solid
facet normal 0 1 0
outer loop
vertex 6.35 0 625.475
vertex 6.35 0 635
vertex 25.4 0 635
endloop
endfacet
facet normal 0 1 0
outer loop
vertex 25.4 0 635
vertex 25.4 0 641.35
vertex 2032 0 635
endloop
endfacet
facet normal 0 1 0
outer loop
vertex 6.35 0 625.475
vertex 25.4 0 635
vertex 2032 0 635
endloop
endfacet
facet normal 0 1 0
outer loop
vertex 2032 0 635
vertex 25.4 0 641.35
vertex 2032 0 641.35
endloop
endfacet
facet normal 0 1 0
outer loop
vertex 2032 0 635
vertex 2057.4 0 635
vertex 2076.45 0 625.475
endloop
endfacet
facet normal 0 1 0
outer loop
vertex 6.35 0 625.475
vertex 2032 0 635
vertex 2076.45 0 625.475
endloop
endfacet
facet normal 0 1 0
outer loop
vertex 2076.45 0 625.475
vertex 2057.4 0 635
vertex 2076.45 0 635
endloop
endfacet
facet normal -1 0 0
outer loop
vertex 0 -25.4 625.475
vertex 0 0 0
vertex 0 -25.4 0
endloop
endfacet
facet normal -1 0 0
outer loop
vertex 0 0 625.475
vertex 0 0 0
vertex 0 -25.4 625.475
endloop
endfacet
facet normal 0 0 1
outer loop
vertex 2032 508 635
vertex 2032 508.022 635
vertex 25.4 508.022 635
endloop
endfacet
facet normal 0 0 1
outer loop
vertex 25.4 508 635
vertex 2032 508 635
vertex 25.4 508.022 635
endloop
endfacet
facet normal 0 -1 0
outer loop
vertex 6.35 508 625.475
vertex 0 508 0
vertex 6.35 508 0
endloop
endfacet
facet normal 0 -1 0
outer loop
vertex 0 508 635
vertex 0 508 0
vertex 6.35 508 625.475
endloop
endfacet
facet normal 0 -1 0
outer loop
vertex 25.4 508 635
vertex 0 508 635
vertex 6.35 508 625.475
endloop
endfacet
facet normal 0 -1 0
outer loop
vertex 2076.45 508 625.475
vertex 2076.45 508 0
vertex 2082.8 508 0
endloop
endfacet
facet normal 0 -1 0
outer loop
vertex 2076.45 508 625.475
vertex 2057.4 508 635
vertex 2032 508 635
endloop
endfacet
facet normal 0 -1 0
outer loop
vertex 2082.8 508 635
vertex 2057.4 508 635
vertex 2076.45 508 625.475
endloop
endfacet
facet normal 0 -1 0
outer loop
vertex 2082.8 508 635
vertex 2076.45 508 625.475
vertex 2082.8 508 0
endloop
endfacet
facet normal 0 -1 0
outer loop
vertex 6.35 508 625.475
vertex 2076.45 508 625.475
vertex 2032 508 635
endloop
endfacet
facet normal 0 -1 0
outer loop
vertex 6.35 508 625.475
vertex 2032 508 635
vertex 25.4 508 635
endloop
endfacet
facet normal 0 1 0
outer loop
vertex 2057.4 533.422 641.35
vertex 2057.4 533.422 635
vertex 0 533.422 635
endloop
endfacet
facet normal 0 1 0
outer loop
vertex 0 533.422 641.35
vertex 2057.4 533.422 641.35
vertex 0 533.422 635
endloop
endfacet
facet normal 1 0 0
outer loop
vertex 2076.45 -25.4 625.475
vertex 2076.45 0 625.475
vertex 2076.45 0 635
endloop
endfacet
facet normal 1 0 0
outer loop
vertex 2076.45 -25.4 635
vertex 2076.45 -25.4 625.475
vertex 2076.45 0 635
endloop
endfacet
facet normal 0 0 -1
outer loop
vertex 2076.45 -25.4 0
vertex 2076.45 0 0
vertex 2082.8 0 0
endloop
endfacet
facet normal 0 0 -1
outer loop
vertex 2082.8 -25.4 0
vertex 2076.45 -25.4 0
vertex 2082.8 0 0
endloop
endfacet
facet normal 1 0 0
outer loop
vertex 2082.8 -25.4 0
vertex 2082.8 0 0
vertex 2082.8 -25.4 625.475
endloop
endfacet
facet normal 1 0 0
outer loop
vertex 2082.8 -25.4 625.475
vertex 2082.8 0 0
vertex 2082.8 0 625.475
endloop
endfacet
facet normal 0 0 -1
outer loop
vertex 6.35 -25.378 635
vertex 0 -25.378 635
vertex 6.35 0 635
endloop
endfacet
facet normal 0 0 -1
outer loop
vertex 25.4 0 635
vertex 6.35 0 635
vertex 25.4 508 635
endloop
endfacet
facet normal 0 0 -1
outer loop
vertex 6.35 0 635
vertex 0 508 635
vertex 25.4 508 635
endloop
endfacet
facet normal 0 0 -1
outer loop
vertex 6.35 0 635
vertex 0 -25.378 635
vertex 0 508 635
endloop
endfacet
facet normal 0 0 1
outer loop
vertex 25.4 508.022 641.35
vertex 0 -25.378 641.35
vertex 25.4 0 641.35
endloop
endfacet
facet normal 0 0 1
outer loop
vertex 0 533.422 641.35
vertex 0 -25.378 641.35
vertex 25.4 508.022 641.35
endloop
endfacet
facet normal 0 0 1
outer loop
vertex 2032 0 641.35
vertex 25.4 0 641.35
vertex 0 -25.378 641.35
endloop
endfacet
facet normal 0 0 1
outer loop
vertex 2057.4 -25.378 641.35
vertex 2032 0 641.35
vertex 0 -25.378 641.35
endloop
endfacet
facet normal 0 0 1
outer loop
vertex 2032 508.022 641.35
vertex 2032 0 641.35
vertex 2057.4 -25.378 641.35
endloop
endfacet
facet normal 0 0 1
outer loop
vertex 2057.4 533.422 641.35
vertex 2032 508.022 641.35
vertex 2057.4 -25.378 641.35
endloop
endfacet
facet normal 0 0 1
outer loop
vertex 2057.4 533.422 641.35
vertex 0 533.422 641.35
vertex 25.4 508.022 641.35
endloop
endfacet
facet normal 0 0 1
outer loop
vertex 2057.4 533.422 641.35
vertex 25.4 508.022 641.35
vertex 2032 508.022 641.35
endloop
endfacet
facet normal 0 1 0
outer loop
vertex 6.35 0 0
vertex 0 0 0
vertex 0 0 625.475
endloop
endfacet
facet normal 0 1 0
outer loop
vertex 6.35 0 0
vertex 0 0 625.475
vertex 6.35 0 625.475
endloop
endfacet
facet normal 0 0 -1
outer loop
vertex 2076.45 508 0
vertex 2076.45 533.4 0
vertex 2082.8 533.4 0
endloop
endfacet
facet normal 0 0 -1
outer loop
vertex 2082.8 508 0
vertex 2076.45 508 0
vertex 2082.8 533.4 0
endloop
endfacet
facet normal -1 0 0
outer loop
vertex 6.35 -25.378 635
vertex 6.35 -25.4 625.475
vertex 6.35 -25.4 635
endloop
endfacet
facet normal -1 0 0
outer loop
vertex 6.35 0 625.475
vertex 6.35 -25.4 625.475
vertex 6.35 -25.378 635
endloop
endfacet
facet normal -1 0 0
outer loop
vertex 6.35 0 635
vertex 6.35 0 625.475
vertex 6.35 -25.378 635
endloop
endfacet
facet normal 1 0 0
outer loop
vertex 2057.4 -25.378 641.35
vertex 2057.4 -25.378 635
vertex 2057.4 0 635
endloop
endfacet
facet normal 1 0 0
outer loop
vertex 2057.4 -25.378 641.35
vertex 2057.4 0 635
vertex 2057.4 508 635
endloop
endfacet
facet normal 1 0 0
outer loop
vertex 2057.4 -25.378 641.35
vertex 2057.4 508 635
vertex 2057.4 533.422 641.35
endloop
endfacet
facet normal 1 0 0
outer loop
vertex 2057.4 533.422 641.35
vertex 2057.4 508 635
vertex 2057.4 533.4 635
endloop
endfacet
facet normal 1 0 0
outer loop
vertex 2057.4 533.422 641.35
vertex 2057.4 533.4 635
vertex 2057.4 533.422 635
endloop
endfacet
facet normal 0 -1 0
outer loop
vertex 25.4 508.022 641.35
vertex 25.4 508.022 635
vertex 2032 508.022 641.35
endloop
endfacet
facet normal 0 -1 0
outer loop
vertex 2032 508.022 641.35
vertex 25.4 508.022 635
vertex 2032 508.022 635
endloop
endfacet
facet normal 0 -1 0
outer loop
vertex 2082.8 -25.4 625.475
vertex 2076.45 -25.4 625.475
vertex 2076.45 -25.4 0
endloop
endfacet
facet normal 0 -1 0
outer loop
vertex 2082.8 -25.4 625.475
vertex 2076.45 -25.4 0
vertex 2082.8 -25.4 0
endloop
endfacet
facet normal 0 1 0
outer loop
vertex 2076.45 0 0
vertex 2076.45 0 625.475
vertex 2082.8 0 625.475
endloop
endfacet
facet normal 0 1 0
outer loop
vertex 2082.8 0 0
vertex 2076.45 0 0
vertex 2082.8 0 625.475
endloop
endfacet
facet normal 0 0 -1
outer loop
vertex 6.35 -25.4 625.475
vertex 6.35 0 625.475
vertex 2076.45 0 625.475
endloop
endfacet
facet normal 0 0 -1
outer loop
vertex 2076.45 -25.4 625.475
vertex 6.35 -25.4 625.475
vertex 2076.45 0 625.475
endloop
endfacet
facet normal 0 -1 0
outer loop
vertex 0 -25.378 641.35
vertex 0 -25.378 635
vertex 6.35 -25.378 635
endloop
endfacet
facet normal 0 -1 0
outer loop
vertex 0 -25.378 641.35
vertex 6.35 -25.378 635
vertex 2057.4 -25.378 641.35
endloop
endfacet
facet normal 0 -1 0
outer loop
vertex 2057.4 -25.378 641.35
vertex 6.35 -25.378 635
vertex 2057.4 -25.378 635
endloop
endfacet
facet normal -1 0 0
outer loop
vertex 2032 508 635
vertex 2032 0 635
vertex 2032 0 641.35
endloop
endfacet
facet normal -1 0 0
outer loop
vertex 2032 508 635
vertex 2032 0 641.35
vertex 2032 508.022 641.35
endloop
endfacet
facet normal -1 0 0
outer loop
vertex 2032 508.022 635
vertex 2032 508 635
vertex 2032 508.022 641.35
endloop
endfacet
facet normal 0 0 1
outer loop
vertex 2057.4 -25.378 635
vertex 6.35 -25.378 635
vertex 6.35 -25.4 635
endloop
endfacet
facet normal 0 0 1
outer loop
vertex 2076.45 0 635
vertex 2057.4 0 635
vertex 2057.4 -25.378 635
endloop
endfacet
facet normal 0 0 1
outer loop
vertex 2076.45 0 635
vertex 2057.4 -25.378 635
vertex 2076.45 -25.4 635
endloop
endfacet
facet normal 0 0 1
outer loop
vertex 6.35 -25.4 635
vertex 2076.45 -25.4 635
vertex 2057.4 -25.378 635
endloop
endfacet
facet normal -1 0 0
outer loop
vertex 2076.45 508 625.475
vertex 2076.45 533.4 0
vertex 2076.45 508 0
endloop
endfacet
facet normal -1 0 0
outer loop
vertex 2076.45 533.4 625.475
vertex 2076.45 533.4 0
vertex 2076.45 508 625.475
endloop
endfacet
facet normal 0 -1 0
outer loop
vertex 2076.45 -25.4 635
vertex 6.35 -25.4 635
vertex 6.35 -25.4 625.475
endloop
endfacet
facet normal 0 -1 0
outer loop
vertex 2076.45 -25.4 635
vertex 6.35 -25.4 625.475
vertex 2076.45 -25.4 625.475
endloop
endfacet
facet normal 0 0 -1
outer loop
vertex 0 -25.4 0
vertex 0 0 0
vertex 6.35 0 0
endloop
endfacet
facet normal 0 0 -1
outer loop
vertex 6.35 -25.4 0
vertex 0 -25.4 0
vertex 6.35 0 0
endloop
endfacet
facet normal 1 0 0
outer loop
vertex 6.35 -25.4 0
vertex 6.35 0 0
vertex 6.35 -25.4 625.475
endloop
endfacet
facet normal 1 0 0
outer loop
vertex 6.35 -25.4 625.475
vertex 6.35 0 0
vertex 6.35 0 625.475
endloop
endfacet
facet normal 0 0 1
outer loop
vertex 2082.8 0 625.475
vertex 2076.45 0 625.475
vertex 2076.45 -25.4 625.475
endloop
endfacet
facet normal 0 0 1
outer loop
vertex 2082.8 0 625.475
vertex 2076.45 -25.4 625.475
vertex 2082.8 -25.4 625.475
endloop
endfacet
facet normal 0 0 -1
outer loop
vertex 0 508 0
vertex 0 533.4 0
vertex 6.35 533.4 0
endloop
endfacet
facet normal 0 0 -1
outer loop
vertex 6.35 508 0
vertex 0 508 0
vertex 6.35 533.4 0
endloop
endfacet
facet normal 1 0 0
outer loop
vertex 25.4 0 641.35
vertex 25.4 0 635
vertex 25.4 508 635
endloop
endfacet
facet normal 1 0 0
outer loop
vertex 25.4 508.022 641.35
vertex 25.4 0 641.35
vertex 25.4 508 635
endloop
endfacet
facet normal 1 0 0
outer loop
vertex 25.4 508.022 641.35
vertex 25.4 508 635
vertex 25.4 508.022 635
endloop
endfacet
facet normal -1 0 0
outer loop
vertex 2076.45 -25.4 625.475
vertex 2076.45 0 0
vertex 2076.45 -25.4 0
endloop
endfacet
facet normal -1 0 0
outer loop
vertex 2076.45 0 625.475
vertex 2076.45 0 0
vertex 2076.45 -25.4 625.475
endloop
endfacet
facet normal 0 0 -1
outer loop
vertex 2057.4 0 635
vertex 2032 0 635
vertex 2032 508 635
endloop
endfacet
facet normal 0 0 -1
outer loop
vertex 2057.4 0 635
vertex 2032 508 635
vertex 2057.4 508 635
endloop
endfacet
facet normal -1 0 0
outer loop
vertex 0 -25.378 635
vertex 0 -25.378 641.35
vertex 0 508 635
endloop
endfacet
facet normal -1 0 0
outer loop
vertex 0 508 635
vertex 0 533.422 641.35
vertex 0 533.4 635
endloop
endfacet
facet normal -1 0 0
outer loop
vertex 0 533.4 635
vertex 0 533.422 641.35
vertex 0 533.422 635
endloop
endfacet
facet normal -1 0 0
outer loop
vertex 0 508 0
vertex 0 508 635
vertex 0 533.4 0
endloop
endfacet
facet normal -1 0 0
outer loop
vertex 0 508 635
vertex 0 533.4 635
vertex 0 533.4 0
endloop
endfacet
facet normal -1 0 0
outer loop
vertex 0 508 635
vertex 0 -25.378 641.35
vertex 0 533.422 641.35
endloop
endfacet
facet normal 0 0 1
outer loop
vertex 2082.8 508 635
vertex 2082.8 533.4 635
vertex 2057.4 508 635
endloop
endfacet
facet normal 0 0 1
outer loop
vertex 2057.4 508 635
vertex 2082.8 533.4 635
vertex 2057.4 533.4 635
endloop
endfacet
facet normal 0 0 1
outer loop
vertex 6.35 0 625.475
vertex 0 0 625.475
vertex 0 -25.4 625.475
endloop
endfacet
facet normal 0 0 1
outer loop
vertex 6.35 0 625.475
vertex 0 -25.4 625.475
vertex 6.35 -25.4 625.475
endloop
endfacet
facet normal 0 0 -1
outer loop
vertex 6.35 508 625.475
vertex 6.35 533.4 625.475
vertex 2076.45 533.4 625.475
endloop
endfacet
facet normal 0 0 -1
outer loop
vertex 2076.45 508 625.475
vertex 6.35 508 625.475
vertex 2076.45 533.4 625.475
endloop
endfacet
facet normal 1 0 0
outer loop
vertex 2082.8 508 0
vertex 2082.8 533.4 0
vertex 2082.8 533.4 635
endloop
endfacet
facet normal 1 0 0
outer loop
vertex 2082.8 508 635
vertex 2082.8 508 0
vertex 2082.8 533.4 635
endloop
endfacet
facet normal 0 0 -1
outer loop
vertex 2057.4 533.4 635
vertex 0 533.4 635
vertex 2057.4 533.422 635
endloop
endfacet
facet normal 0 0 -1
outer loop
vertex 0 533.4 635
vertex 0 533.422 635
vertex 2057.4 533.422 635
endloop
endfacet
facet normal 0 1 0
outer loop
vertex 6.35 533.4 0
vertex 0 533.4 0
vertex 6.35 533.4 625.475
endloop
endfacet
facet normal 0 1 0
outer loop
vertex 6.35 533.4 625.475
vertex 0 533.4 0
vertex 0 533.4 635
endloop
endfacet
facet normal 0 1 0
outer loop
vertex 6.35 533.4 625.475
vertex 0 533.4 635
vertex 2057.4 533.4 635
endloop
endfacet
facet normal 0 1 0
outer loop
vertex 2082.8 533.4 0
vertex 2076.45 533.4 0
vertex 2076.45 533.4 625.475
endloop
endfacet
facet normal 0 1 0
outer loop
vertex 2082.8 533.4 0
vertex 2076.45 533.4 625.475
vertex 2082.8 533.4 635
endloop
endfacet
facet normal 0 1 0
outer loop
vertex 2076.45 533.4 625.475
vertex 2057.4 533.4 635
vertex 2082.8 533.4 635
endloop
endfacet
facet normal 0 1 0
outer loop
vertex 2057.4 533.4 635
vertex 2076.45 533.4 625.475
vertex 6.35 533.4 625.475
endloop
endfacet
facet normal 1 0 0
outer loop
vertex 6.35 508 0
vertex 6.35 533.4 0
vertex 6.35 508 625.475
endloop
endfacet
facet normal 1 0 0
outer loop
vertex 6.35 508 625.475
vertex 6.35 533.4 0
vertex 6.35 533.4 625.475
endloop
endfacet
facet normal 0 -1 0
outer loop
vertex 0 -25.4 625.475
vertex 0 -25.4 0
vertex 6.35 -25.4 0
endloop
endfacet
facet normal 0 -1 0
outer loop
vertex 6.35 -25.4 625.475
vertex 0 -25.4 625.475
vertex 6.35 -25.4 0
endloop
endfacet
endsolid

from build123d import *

# Parameters (mm, degrees)
F0_W     = 2070.1
F0_H     = 9.525
F1_DEPTH = 25.4
F0_W_2   = 6.35
F0_H_2   = 625.475
F3_W     = 2006.6
F3_H     = 25.3777652979
F3_W_2   = 25.4
F3_H_2   = 25.4
F3_H_3   = 508.0222347021
F4_DEPTH = 6.35
F6_W     = 6.35
F6_H     = 625.475
F6_H_2   = 9.525
F6_W_2   = 2070.1
F7_DEPTH = 25.4


with BuildPart() as f1:
    # F0 (on Front) → F1 (new body)
    with BuildSketch(Plane.XZ):
        with Locations((1041.4, 630.2375)):
            Rectangle(F0_W, F0_H)
    extrude(amount=F1_DEPTH)

    # F3 (on offset) → F4 (join)
    with BuildSketch(Plane.XY.offset(635)):
        Polygon((0, 508.0222347021), (0, -25.3777652979), (25.4, -25.3777652979), (25.4, 0), (25.4, 508.0222347021), align=None)
        with Locations((1028.7, -12.6888826489)):
            Rectangle(F3_W, F3_H)
        with Locations((12.7, 520.7222347021)):
            Rectangle(F3_W_2, F3_H_2)
        with Locations((2044.7, -12.6888826489)):
            Rectangle(F3_W_2, F3_H)
        with Locations((1028.7, 520.7222347021)):
            Rectangle(F3_W, F3_H_2)
        with Locations((2044.7, 254.0111173511)):
            Rectangle(F3_W_2, F3_H_3)
        with Locations((2044.7, 520.7222347021)):
            Rectangle(F3_W_2, F3_H_2)
    extrude(amount=F4_DEPTH)

    # F6 (on offset) → F7 (join)
    with BuildSketch(Plane.XZ.offset(-533.4)):
        with Locations((3.175, 312.7375)):
            Rectangle(F6_W, F6_H)
        with Locations((3.175, 630.2375)):
            Rectangle(F6_W, F6_H_2)
        with Locations((1041.4, 630.2375)):
            Rectangle(F6_W_2, F6_H_2)
        with Locations((2079.625, 630.2375)):
            Rectangle(F6_W, F6_H_2)
        with Locations((2079.625, 312.7375)):
            Rectangle(F6_W, F6_H)
    extrude(amount=F7_DEPTH)


with BuildPart() as f1b:
    # F0 (on Front) → F1, piece 2 (new body)
    with BuildSketch(Plane.XZ):
        with Locations((3.175, 312.7375)):
            Rectangle(F0_W_2, F0_H_2)
    extrude(amount=F1_DEPTH)


with BuildPart() as f1c:
    # F0 (on Front) → F1, piece 3 (new body)
    with BuildSketch(Plane.XZ):
        with Locations((2079.625, 312.7375)):
            Rectangle(F0_W_2, F0_H_2)
    extrude(amount=F1_DEPTH)


solid = Compound([f1.part, f1b.part, f1c.part])
